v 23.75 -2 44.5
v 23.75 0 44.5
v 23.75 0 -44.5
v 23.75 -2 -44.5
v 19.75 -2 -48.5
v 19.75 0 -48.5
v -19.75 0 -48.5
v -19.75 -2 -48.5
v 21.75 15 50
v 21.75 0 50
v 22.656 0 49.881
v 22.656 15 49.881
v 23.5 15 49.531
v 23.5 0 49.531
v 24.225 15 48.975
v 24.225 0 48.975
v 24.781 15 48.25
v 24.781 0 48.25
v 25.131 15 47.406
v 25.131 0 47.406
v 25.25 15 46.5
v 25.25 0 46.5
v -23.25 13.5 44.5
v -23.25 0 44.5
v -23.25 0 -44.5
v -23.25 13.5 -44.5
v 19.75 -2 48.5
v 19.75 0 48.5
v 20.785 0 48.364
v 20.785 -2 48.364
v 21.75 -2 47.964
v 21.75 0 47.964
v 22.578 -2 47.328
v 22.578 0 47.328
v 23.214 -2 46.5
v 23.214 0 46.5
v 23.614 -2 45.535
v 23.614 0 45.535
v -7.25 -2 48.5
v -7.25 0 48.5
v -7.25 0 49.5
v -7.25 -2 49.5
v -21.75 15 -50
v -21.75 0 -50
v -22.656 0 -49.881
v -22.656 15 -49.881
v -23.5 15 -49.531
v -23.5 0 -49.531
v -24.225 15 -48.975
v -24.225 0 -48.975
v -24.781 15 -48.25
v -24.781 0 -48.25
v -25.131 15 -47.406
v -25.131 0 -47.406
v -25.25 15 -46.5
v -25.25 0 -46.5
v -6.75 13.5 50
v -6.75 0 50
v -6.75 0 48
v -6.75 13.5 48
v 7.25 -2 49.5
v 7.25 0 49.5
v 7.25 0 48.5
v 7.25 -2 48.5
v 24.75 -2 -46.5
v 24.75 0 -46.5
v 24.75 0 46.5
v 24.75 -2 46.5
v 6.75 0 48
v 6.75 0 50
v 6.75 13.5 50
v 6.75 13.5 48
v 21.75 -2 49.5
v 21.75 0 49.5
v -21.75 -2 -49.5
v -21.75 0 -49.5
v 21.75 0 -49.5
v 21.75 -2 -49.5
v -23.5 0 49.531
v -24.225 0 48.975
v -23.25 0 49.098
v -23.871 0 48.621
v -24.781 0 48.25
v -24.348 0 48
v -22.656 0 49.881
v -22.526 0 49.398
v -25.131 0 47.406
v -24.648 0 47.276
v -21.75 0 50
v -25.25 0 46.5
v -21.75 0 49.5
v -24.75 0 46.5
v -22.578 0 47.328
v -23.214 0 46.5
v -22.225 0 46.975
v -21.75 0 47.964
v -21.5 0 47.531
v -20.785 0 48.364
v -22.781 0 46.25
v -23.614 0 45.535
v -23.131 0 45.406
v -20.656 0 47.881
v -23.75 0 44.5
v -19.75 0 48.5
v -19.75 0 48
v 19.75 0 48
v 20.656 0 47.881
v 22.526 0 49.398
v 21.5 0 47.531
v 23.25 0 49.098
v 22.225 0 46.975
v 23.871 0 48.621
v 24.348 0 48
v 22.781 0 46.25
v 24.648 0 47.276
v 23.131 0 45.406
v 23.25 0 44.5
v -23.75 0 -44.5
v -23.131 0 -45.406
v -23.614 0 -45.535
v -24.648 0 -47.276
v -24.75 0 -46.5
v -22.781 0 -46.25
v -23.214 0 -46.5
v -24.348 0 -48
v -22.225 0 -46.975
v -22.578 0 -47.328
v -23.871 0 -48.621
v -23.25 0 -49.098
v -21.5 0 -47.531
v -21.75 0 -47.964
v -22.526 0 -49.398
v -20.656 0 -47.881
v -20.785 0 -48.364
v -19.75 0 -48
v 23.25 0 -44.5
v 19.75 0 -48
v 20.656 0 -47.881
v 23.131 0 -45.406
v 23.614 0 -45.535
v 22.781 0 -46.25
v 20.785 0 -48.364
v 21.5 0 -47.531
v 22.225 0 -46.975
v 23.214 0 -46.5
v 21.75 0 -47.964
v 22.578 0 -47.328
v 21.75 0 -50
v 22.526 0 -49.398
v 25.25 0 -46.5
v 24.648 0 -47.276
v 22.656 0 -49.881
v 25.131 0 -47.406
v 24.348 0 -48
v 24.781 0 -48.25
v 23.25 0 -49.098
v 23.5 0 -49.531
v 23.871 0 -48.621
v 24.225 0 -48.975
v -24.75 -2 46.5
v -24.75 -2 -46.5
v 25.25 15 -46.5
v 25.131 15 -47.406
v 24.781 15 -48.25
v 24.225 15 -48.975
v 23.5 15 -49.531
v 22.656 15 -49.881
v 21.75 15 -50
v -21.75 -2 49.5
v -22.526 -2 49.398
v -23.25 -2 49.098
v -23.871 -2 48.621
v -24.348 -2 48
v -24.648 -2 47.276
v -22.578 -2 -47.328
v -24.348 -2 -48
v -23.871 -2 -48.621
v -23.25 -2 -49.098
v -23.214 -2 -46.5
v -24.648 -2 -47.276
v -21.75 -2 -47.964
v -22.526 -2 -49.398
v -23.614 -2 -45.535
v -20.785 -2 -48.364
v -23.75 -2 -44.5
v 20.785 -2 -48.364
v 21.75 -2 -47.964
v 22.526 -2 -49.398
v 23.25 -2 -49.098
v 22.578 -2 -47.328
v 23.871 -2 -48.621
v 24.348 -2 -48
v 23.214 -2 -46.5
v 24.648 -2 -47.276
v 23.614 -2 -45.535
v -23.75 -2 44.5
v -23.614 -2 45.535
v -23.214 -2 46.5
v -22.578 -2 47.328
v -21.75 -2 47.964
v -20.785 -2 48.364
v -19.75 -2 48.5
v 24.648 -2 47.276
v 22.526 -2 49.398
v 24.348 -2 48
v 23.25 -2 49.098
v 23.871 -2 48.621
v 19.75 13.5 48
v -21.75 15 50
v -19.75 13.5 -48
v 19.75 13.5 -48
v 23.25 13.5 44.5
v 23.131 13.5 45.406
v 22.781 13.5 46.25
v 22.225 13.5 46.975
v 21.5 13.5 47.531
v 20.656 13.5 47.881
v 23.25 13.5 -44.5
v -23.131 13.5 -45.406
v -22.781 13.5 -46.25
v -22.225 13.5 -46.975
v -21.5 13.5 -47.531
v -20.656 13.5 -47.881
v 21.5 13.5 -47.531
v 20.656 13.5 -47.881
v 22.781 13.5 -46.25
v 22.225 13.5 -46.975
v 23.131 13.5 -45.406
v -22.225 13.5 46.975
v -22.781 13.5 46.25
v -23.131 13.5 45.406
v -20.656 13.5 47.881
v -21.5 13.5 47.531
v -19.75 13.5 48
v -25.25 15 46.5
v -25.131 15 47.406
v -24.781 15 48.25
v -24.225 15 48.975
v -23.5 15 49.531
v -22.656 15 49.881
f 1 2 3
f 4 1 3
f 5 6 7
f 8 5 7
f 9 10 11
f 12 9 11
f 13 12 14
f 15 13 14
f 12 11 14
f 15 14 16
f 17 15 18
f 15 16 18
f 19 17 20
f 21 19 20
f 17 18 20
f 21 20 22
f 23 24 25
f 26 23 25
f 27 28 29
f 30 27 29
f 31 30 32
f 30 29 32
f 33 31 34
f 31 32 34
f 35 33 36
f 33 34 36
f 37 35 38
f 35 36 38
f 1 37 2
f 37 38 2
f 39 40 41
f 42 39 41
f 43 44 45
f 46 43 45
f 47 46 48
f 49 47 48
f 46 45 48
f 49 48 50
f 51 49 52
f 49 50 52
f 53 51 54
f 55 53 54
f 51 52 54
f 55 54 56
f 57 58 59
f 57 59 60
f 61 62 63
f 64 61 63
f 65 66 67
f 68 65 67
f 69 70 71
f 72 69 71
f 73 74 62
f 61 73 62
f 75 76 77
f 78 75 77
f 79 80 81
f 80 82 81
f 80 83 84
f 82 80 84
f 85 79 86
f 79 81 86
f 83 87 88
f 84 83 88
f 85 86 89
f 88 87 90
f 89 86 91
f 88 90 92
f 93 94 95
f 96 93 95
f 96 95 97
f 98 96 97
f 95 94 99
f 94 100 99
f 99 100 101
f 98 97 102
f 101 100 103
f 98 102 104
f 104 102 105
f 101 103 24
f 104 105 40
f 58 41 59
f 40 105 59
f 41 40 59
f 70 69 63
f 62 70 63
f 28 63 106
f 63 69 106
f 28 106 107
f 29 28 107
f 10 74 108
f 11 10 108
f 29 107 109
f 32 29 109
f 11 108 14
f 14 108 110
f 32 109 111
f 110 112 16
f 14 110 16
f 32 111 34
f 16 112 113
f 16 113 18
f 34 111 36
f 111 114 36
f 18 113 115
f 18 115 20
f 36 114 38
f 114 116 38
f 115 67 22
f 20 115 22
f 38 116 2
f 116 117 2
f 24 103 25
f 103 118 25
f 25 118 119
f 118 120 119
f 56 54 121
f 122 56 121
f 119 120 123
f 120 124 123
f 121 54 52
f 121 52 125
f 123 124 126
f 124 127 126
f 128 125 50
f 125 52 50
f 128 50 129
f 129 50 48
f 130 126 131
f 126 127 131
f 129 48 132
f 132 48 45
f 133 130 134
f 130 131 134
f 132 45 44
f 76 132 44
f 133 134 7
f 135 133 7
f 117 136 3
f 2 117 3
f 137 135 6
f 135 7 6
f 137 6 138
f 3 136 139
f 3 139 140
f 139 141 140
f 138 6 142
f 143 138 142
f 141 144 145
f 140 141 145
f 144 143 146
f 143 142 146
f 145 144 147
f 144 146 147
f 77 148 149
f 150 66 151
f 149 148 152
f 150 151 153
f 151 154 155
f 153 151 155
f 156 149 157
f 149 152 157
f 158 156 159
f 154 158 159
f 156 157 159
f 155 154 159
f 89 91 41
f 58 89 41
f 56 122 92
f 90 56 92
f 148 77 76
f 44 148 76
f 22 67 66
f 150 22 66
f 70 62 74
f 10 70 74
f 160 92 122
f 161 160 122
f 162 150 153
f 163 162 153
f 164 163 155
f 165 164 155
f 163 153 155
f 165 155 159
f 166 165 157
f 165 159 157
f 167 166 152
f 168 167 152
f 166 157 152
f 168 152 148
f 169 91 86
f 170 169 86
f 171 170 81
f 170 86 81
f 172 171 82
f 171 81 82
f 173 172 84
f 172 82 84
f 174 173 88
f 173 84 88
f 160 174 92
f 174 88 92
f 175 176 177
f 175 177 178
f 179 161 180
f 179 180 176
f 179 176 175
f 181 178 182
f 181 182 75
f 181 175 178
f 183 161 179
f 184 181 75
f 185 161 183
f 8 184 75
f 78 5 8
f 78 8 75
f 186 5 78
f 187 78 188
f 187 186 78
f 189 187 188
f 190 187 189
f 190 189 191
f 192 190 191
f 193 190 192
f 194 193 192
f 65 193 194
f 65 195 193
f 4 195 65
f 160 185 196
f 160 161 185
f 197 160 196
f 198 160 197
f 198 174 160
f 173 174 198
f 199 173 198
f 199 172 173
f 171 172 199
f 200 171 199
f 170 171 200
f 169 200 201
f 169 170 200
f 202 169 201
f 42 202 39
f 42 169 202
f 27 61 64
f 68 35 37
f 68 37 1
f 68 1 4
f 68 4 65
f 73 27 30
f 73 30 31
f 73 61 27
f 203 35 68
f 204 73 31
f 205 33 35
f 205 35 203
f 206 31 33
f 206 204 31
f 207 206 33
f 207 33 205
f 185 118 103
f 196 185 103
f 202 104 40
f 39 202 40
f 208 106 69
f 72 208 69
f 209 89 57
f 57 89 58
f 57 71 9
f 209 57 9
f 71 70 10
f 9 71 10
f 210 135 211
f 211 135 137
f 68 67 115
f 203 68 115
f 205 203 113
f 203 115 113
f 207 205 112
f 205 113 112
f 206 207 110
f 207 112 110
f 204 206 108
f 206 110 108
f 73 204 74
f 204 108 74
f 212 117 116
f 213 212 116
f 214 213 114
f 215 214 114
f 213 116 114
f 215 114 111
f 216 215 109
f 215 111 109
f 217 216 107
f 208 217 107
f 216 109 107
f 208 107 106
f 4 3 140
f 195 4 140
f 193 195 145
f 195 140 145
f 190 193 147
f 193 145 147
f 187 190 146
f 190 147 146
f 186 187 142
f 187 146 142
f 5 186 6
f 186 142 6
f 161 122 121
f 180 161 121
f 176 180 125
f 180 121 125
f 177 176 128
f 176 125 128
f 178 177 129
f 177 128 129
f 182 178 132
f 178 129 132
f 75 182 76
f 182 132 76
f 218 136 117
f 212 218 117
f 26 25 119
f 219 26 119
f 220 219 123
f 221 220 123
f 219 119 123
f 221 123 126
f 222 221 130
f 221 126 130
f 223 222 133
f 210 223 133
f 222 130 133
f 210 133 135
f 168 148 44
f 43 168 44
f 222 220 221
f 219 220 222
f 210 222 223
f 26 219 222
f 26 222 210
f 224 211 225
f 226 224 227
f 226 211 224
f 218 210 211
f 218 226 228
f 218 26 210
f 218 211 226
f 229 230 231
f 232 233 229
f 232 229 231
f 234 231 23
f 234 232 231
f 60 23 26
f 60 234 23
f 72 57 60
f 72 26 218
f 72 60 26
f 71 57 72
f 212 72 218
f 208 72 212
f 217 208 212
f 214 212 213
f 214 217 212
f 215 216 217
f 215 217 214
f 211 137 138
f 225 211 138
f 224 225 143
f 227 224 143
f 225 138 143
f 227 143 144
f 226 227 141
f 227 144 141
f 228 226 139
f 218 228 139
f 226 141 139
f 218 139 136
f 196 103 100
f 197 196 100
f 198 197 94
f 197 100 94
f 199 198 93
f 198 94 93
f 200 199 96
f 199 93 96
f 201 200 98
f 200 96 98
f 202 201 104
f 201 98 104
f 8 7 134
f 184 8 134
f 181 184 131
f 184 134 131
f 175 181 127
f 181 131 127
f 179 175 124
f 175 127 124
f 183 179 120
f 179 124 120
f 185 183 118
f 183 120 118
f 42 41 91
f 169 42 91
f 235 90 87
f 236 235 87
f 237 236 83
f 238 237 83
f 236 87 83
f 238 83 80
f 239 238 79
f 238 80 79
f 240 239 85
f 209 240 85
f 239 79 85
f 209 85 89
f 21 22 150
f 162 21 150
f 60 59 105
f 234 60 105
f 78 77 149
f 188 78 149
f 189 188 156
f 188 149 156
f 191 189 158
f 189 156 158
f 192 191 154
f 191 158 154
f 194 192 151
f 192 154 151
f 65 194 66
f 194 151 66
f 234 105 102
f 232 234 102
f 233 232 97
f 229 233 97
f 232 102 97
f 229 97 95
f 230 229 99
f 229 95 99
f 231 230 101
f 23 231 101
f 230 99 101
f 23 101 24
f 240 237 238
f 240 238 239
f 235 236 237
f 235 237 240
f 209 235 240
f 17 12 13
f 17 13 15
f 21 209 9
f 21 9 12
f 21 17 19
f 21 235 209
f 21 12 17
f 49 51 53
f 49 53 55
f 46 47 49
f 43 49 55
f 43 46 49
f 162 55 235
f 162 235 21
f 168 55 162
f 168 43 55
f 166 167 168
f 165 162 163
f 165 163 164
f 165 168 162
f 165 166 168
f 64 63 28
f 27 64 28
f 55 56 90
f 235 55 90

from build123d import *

# Parameters (mm, degrees)
BOSS_EXTRUDE1_DEPTH     = 15
CUT_EXTRUDE1_DEPTH      = 13.5
SKETCH3_W               = 13.5
SKETCH3_H               = 27
CUT_EXTRUDE2_DEPTH      = 15
SALIENTE_EXTRUIR1_DEPTH = 2


with BuildPart() as part:
    # Sketch1 → Boss-Extrude1 (new body)
    with BuildSketch(Plane(origin=(0, 0, 0), x_dir=(1, 0, 0), z_dir=(0, 1, 0))):
        with BuildLine():
            Line((-21.75, -50), (21.75, -50))
            ThreePointArc((21.75, -50), (24.224873734, -48.974873734), (25.25, -46.5))
            Line((25.25, -46.5), (25.25, 46.5))
            ThreePointArc((25.25, 46.5), (24.224873734, 48.974873734), (21.75, 50))
            Line((21.75, 50), (-21.75, 50))
            ThreePointArc((-21.75, 50), (-24.224873734, 48.974873734), (-25.25, 46.5))
            Line((-25.25, 46.5), (-25.25, -46.5))
            ThreePointArc((-25.25, -46.5), (-24.224873734, -48.974873734), (-21.75, -50))
        make_face()
    extrude(amount=BOSS_EXTRUDE1_DEPTH)

    # Sketch2 → Cut-Extrude1 (cut)
    with BuildSketch(Plane.XZ):
        with BuildLine():
            Line((-19.75, -48), (19.75, -48))
            ThreePointArc((19.75, -48), (22.224873734, -46.974873734), (23.25, -44.5))
            Line((23.25, -44.5), (23.25, 44.5))
            ThreePointArc((23.25, 44.5), (22.224873734, 46.974873734), (19.75, 48))
            Line((19.75, 48), (-19.75, 48))
            ThreePointArc((-19.75, 48), (-22.224873734, 46.974873734), (-23.25, 44.5))
            Line((-23.25, 44.5), (-23.25, -44.5))
            ThreePointArc((-23.25, -44.5), (-22.224873734, -46.974873734), (-19.75, -48))
        make_face()
    extrude(amount=-CUT_EXTRUDE1_DEPTH, mode=Mode.SUBTRACT)

    # Sketch3 → Cut-Extrude2 (cut)
    with BuildSketch(Plane.XY.offset(50)):
        Rectangle(SKETCH3_W, SKETCH3_H)
    extrude(amount=-CUT_EXTRUDE2_DEPTH, mode=Mode.SUBTRACT)

    # Croquis3 → Saliente-Extruir1 (add)
    with BuildSketch(Plane.XZ):
        with BuildLine():
            Line((7.25, 48.5), (19.75, 48.5))
            ThreePointArc((19.75, 48.5), (22.578427125, 47.328427125), (23.75, 44.5))
            Line((23.75, 44.5), (23.75, -44.5))
            ThreePointArc((23.75, -44.5), (22.578427125, -47.328427125), (19.75, -48.5))
            Line((19.75, -48.5), (-19.75, -48.5))
            ThreePointArc((-19.75, -48.5), (-22.578427125, -47.328427125), (-23.75, -44.5))
            Line((-23.75, -44.5), (-23.75, 44.5))
            ThreePointArc((-23.75, 44.5), (-22.578427125, 47.328427125), (-19.75, 48.5))
            Line((-19.75, 48.5), (-7.25, 48.5))
            Line((-7.25, 48.5), (-7.25, 49.5))
            Line((-7.25, 49.5), (-21.75, 49.5))
            ThreePointArc((-21.75, 49.5), (-23.871320344, 48.621320344), (-24.75, 46.5))
            Line((-24.75, 46.5), (-24.75, -46.5))
            ThreePointArc((-24.75, -46.5), (-23.871320344, -48.621320344), (-21.75, -49.5))
            Line((-21.75, -49.5), (21.75, -49.5))
            ThreePointArc((21.75, -49.5), (23.871320344, -48.621320344), (24.75, -46.5))
            Line((24.75, -46.5), (24.75, 46.5))
            ThreePointArc((24.75, 46.5), (23.871320344, 48.621320344), (21.75, 49.5))
            Line((21.75, 49.5), (7.25, 49.5))
            Line((7.25, 49.5), (7.25, 48.5))
        make_face()
    extrude(amount=SALIENTE_EXTRUIR1_DEPTH)


solid = part.part
